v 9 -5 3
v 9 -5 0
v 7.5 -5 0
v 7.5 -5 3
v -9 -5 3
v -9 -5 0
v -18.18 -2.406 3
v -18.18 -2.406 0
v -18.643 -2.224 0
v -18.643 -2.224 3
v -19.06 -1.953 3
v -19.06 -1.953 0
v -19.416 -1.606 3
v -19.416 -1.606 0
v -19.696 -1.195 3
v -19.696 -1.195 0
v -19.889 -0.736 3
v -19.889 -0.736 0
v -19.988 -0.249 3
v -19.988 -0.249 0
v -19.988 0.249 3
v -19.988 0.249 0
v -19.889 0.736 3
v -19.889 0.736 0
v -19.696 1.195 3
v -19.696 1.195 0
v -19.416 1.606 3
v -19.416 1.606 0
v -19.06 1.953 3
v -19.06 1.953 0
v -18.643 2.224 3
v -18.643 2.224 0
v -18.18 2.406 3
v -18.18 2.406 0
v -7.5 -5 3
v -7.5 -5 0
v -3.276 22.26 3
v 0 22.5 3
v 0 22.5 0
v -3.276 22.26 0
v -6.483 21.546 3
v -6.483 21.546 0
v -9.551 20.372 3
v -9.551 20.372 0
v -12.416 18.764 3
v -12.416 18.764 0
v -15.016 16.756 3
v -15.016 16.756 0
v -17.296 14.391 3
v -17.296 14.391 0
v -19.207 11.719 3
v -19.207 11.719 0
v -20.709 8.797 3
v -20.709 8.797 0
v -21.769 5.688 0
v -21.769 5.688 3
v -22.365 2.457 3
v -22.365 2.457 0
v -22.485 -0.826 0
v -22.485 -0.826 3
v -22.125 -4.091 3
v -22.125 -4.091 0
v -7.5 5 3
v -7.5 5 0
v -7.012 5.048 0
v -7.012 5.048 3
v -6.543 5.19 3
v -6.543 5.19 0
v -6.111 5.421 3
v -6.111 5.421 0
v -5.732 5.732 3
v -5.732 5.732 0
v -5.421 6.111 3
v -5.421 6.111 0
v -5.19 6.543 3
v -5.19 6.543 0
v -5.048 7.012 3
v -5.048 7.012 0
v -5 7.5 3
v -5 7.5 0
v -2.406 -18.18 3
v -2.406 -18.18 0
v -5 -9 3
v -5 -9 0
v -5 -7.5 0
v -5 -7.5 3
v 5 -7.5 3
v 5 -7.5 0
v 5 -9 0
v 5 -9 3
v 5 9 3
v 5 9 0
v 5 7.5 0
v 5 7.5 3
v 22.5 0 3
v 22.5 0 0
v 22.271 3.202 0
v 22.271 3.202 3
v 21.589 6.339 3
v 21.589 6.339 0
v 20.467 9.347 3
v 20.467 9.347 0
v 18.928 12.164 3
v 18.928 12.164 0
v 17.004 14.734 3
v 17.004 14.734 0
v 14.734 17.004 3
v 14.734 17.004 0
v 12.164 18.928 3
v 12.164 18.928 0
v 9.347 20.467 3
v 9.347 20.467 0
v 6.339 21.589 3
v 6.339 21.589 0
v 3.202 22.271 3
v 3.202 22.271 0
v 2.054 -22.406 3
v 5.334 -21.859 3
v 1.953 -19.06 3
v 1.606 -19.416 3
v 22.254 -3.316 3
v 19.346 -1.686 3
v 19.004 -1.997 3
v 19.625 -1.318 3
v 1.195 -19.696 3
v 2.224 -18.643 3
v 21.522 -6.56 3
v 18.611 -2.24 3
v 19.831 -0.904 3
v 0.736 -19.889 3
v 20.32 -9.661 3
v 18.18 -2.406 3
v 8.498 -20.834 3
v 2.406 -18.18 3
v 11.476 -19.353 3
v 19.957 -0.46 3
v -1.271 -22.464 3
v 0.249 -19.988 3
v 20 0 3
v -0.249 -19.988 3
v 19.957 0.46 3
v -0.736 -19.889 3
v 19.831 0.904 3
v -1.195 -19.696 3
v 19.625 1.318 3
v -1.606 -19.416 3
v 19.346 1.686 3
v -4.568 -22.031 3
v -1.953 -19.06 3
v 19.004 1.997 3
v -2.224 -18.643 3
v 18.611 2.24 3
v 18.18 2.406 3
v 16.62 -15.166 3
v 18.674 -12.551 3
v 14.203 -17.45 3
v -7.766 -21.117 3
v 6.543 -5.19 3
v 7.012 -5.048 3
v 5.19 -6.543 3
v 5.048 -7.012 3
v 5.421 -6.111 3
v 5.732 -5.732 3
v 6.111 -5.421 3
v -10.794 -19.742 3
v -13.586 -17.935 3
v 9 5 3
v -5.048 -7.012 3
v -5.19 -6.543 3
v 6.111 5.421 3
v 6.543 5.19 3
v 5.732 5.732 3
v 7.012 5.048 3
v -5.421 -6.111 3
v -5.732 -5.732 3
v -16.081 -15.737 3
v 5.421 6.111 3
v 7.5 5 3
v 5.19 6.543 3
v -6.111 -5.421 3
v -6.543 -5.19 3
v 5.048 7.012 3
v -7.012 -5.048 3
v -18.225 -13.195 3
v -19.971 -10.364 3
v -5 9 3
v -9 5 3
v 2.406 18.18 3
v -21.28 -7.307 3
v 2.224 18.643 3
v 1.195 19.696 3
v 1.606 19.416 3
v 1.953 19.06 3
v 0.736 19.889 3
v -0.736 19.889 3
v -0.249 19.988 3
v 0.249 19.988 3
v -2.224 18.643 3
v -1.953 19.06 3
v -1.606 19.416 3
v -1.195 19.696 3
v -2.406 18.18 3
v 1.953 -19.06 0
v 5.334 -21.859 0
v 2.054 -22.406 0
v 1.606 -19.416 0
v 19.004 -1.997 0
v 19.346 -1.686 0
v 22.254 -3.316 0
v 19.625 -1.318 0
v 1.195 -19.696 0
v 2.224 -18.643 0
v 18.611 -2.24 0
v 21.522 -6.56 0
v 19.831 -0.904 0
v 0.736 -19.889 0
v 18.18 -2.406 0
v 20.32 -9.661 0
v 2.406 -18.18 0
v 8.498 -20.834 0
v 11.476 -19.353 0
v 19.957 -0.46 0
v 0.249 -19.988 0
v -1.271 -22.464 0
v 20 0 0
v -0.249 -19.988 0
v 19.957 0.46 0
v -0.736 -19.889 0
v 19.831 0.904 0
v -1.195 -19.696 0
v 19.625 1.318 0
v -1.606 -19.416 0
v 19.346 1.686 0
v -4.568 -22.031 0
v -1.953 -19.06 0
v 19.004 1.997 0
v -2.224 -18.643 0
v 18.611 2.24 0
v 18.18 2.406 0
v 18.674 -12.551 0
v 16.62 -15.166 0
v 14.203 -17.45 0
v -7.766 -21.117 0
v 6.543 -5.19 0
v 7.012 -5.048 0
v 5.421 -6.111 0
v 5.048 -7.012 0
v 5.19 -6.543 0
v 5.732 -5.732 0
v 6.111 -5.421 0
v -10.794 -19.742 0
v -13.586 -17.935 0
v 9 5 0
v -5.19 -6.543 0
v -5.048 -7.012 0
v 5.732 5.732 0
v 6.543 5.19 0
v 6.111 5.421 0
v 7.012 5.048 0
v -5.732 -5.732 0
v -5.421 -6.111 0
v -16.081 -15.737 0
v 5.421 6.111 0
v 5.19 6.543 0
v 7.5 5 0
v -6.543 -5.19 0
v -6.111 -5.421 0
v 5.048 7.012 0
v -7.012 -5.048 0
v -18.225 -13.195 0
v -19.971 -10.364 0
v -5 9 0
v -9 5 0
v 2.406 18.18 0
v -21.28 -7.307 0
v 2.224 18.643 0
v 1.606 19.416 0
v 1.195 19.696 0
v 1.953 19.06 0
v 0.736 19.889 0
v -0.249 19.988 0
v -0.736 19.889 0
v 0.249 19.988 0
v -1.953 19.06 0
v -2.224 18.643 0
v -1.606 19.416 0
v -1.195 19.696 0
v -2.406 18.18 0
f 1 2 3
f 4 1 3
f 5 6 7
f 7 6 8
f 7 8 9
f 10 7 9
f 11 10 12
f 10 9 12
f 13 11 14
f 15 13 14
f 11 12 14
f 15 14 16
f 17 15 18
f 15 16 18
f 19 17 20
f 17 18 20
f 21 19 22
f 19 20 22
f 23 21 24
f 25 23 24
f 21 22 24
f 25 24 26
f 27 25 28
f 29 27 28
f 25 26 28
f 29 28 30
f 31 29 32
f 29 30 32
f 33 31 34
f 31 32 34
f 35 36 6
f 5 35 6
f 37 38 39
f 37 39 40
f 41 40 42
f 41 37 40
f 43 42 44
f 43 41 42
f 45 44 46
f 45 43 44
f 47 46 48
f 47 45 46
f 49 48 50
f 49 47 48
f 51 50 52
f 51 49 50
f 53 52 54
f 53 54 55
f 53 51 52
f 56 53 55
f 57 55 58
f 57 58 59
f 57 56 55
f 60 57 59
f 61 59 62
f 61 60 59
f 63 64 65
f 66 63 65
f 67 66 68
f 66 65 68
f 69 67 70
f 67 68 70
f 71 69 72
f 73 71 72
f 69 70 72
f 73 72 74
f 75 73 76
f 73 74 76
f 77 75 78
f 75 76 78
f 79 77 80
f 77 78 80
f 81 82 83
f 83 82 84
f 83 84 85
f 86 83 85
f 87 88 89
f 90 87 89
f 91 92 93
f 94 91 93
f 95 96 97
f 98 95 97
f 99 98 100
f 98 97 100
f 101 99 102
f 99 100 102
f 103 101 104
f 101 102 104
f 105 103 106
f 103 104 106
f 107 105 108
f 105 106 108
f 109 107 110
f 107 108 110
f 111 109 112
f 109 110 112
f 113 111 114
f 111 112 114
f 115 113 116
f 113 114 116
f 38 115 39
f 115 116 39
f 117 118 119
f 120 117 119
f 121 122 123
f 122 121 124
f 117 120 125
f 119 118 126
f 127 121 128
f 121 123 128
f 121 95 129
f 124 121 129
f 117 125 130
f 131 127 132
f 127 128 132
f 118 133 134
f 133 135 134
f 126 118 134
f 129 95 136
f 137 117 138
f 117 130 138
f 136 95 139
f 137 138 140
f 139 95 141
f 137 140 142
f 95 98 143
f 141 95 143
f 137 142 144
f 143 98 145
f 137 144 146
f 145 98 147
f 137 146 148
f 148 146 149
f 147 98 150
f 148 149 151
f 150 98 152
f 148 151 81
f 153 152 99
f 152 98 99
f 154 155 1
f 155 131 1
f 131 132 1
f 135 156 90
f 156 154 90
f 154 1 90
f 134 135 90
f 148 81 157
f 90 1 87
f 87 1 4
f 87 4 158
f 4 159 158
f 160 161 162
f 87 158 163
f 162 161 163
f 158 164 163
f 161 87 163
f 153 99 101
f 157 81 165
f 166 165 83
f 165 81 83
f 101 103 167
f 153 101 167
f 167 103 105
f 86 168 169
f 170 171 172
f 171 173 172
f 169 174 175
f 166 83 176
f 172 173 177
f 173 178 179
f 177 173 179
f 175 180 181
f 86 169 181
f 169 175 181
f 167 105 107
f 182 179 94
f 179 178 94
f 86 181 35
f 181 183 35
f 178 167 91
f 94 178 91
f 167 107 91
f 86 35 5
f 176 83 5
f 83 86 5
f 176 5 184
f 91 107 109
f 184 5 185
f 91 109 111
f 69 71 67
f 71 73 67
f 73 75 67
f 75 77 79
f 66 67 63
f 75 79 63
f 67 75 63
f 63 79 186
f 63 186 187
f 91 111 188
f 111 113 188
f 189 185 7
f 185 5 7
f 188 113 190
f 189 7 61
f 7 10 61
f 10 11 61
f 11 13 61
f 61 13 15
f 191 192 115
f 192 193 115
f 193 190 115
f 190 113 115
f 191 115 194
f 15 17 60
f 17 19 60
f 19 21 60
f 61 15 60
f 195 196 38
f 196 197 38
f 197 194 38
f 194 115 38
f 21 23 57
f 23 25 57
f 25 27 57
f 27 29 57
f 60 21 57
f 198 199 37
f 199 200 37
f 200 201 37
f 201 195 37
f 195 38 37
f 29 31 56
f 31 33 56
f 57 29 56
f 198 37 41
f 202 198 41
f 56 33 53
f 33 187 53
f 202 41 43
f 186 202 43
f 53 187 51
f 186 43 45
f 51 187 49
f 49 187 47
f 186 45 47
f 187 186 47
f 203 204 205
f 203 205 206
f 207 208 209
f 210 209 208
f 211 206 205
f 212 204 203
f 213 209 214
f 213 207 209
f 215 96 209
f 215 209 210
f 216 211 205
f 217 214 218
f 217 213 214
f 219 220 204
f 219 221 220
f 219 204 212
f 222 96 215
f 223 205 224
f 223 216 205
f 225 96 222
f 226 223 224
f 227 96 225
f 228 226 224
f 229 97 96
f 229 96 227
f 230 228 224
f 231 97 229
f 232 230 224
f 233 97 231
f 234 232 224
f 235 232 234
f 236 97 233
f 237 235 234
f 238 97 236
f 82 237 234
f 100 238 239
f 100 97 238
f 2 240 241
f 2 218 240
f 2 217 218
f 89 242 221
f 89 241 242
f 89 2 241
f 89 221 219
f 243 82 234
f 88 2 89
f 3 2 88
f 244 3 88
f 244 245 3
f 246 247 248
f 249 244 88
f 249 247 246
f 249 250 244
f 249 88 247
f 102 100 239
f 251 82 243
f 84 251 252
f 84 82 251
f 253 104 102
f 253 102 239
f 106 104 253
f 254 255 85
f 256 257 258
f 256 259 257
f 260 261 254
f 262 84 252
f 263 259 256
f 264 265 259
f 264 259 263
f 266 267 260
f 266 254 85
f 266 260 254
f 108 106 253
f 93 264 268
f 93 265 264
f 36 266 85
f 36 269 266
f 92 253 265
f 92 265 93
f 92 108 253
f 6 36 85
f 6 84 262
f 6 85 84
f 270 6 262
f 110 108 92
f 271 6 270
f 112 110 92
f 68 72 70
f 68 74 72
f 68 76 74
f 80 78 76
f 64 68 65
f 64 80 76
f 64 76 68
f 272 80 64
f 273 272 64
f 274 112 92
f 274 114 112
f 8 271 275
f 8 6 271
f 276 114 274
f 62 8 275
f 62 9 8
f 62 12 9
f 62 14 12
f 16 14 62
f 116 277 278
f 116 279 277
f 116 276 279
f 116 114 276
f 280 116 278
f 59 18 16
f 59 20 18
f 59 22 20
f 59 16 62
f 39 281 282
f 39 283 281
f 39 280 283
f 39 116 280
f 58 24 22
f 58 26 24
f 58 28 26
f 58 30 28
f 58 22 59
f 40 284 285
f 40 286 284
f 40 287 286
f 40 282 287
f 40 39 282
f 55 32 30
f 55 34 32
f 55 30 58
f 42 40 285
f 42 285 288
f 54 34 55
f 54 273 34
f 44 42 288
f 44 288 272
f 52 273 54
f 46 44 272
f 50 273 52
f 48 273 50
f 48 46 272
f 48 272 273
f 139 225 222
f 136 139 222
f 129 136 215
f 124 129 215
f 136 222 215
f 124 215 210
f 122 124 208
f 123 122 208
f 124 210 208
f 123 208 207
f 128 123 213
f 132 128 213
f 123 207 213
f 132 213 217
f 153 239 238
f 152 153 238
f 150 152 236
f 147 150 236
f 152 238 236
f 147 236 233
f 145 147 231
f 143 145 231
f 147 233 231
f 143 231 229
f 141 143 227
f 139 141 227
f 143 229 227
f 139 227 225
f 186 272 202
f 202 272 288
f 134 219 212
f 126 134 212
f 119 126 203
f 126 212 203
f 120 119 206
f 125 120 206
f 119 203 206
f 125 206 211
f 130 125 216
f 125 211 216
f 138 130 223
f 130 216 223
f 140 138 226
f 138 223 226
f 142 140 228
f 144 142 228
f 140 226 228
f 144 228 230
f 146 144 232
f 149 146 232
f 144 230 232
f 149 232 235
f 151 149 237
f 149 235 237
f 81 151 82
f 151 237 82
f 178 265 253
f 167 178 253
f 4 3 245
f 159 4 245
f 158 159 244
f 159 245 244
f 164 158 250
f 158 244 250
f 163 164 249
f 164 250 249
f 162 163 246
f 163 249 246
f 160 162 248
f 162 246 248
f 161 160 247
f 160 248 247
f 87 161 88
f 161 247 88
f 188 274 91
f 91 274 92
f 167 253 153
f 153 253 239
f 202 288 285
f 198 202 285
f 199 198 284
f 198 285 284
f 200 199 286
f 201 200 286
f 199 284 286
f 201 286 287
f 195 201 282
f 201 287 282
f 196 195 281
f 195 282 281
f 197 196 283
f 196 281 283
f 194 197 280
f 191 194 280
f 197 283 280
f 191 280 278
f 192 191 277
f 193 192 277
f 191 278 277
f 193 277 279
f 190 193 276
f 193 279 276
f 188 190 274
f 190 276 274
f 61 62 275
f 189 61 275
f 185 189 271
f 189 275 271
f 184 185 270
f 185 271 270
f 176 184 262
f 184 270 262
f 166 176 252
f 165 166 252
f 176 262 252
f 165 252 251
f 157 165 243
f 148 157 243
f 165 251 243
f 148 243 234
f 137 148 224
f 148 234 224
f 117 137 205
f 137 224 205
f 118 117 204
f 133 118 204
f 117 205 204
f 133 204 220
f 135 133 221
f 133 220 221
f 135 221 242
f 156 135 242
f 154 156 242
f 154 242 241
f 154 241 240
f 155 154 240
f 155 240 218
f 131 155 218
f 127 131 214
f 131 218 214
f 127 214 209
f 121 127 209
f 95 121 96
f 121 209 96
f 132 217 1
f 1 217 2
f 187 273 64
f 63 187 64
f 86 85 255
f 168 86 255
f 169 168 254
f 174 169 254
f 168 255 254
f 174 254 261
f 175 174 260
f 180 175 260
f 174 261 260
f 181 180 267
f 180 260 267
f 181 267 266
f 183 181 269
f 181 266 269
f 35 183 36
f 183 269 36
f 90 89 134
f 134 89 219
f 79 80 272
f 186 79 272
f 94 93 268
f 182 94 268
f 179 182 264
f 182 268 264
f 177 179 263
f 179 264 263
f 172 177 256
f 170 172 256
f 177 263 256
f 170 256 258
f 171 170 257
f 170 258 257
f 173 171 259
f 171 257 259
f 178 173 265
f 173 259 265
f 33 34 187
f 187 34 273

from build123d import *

# Parameters (mm, degrees)
SKETCH1_R           = 2.5
SKETCH1_W           = 57
SKETCH1_H           = 22.5
BOSS_EXTRUDE1_DEPTH = 3
CUT_EXTRUDE1_DEPTH  = 83.677082677


with BuildPart() as part:
    # Sketch1 → Boss-Extrude1 (new body)
    # profile 1 of 8: a face of its own
    with BuildSketch(Plane.XY):
        with BuildLine():
            ThreePointArc((22.5, 0), (15.909902577, 15.909902577), (0, 22.5))
            Line((0, 22.5), (-22.5, 0))
            Line((-22.5, 0), (-22.124973736, -4.090909091))
            ThreePointArc((-22.124973736, -4.090909091), (2.054031517, -22.406047276), (22.5, 0))
        make_face()
        with BuildLine():
            ThreePointArc((-7.5, 5), (-9.267766953, 9.267766953), (-5, 7.5))
            Line((-5, 7.5), (-5, 9))
            Line((-5, 9), (-2.405779746, 18.179870439))
            ThreePointArc((-2.405779746, 18.179870439), (0, 20), (2.405779746, 18.179870439))
            Line((2.405779746, 18.179870439), (5, 9))
            Line((5, 9), (5, 7.5))
            ThreePointArc((5, 7.5), (7.5, 10), (10, 7.5))
            ThreePointArc((10, 7.5), (9.267766953, 5.732233047), (7.5, 5))
            Line((7.5, 5), (9, 5))
            Line((9, 5), (18.179870439, 2.405779746))
            ThreePointArc((18.179870439, 2.405779746), (19.493699588, 1.508363998), (20, 0))
            ThreePointArc((20, 0), (19.493699588, -1.508363998), (18.179870439, -2.405779746))
            Line((18.179870439, -2.405779746), (9, -5))
            Line((9, -5), (7.5, -5))
            ThreePointArc((7.5, -5), (9.267766953, -5.732233047), (10, -7.5))
            ThreePointArc((10, -7.5), (7.5, -10), (5, -7.5))
            Line((5, -7.5), (5, -9))
            Line((5, -9), (2.405779746, -18.179870439))
            ThreePointArc((2.405779746, -18.179870439), (0, -20), (-2.405779746, -18.179870439))
            Line((-2.405779746, -18.179870439), (-5, -9))
            Line((-5, -9), (-5, -7.5))
            ThreePointArc((-5, -7.5), (-9.267766953, -9.267766953), (-7.5, -5))
            Line((-7.5, -5), (-9, -5))
            Line((-9, -5), (-18.179870439, -2.405779746))
            ThreePointArc((-18.179870439, -2.405779746), (-20, 0), (-18.179870439, 2.405779746))
            Line((-18.179870439, 2.405779746), (-9, 5))
            Line((-9, 5), (-7.5, 5))
        make_face(mode=Mode.SUBTRACT)
    # profile 2 of 8: a face of its own
    with BuildSketch(Plane.XY):
        with Locations((-7.5, 7.5)):
            Circle(SKETCH1_R)
    # profile 3 of 8: a face of its own
    with BuildSketch(Plane.XY):
        with Locations((7.5, 7.5)):
            Circle(SKETCH1_R)
    # profile 4 of 8: a face of its own
    with BuildSketch(Plane.XY):
        with Locations((7.5, -7.5)):
            Circle(SKETCH1_R)
    # profile 5 of 8: a face of its own
    with BuildSketch(Plane.XY):
        with Locations((-7.5, -7.5)):
            Circle(SKETCH1_R)
    # profile 6 of 8: a face of its own
    with BuildSketch(Plane.XY):
        Polygon((-22.5, 22.5), (0, 22.5), (-22.5, 0), align=None)
    # profile 7 of 8: a face of its own
    with BuildSketch(Plane.XY):
        with Locations((-51, 11.25)):
            Rectangle(SKETCH1_W, SKETCH1_H)
    # profile 8 of 8: a face of its own
    with BuildSketch(Plane.XY):
        with BuildLine():
            Line((-22.5, 0), (-22.124973736, -4.090909091))
            ThreePointArc((-22.124973736, -4.090909091), (-23.843623821, -1.156469426), (-27.041634566, 0))
            Line((-27.041634566, 0), (-22.5, 0))
        make_face()
    extrude(amount=BOSS_EXTRUDE1_DEPTH)

    # Sketch4 → Cut-Extrude1 (cut, through all)
    with BuildSketch(Plane.XY.offset(3)):
        with BuildLine():
            Line((-79.5, 22.5), (0, 22.5))
            ThreePointArc((0, 22.5), (-17.295887583, 14.391048354), (-22.124973736, -4.090909091))
            ThreePointArc((-22.124973736, -4.090909091), (-23.843623821, -1.156469426), (-27.041634566, 0))
            Line((-27.041634566, 0), (-79.5, 0))
            Line((-79.5, 0), (-79.5, 22.5))
        make_face()
    extrude(amount=-CUT_EXTRUDE1_DEPTH, mode=Mode.SUBTRACT)


solid = part.part
